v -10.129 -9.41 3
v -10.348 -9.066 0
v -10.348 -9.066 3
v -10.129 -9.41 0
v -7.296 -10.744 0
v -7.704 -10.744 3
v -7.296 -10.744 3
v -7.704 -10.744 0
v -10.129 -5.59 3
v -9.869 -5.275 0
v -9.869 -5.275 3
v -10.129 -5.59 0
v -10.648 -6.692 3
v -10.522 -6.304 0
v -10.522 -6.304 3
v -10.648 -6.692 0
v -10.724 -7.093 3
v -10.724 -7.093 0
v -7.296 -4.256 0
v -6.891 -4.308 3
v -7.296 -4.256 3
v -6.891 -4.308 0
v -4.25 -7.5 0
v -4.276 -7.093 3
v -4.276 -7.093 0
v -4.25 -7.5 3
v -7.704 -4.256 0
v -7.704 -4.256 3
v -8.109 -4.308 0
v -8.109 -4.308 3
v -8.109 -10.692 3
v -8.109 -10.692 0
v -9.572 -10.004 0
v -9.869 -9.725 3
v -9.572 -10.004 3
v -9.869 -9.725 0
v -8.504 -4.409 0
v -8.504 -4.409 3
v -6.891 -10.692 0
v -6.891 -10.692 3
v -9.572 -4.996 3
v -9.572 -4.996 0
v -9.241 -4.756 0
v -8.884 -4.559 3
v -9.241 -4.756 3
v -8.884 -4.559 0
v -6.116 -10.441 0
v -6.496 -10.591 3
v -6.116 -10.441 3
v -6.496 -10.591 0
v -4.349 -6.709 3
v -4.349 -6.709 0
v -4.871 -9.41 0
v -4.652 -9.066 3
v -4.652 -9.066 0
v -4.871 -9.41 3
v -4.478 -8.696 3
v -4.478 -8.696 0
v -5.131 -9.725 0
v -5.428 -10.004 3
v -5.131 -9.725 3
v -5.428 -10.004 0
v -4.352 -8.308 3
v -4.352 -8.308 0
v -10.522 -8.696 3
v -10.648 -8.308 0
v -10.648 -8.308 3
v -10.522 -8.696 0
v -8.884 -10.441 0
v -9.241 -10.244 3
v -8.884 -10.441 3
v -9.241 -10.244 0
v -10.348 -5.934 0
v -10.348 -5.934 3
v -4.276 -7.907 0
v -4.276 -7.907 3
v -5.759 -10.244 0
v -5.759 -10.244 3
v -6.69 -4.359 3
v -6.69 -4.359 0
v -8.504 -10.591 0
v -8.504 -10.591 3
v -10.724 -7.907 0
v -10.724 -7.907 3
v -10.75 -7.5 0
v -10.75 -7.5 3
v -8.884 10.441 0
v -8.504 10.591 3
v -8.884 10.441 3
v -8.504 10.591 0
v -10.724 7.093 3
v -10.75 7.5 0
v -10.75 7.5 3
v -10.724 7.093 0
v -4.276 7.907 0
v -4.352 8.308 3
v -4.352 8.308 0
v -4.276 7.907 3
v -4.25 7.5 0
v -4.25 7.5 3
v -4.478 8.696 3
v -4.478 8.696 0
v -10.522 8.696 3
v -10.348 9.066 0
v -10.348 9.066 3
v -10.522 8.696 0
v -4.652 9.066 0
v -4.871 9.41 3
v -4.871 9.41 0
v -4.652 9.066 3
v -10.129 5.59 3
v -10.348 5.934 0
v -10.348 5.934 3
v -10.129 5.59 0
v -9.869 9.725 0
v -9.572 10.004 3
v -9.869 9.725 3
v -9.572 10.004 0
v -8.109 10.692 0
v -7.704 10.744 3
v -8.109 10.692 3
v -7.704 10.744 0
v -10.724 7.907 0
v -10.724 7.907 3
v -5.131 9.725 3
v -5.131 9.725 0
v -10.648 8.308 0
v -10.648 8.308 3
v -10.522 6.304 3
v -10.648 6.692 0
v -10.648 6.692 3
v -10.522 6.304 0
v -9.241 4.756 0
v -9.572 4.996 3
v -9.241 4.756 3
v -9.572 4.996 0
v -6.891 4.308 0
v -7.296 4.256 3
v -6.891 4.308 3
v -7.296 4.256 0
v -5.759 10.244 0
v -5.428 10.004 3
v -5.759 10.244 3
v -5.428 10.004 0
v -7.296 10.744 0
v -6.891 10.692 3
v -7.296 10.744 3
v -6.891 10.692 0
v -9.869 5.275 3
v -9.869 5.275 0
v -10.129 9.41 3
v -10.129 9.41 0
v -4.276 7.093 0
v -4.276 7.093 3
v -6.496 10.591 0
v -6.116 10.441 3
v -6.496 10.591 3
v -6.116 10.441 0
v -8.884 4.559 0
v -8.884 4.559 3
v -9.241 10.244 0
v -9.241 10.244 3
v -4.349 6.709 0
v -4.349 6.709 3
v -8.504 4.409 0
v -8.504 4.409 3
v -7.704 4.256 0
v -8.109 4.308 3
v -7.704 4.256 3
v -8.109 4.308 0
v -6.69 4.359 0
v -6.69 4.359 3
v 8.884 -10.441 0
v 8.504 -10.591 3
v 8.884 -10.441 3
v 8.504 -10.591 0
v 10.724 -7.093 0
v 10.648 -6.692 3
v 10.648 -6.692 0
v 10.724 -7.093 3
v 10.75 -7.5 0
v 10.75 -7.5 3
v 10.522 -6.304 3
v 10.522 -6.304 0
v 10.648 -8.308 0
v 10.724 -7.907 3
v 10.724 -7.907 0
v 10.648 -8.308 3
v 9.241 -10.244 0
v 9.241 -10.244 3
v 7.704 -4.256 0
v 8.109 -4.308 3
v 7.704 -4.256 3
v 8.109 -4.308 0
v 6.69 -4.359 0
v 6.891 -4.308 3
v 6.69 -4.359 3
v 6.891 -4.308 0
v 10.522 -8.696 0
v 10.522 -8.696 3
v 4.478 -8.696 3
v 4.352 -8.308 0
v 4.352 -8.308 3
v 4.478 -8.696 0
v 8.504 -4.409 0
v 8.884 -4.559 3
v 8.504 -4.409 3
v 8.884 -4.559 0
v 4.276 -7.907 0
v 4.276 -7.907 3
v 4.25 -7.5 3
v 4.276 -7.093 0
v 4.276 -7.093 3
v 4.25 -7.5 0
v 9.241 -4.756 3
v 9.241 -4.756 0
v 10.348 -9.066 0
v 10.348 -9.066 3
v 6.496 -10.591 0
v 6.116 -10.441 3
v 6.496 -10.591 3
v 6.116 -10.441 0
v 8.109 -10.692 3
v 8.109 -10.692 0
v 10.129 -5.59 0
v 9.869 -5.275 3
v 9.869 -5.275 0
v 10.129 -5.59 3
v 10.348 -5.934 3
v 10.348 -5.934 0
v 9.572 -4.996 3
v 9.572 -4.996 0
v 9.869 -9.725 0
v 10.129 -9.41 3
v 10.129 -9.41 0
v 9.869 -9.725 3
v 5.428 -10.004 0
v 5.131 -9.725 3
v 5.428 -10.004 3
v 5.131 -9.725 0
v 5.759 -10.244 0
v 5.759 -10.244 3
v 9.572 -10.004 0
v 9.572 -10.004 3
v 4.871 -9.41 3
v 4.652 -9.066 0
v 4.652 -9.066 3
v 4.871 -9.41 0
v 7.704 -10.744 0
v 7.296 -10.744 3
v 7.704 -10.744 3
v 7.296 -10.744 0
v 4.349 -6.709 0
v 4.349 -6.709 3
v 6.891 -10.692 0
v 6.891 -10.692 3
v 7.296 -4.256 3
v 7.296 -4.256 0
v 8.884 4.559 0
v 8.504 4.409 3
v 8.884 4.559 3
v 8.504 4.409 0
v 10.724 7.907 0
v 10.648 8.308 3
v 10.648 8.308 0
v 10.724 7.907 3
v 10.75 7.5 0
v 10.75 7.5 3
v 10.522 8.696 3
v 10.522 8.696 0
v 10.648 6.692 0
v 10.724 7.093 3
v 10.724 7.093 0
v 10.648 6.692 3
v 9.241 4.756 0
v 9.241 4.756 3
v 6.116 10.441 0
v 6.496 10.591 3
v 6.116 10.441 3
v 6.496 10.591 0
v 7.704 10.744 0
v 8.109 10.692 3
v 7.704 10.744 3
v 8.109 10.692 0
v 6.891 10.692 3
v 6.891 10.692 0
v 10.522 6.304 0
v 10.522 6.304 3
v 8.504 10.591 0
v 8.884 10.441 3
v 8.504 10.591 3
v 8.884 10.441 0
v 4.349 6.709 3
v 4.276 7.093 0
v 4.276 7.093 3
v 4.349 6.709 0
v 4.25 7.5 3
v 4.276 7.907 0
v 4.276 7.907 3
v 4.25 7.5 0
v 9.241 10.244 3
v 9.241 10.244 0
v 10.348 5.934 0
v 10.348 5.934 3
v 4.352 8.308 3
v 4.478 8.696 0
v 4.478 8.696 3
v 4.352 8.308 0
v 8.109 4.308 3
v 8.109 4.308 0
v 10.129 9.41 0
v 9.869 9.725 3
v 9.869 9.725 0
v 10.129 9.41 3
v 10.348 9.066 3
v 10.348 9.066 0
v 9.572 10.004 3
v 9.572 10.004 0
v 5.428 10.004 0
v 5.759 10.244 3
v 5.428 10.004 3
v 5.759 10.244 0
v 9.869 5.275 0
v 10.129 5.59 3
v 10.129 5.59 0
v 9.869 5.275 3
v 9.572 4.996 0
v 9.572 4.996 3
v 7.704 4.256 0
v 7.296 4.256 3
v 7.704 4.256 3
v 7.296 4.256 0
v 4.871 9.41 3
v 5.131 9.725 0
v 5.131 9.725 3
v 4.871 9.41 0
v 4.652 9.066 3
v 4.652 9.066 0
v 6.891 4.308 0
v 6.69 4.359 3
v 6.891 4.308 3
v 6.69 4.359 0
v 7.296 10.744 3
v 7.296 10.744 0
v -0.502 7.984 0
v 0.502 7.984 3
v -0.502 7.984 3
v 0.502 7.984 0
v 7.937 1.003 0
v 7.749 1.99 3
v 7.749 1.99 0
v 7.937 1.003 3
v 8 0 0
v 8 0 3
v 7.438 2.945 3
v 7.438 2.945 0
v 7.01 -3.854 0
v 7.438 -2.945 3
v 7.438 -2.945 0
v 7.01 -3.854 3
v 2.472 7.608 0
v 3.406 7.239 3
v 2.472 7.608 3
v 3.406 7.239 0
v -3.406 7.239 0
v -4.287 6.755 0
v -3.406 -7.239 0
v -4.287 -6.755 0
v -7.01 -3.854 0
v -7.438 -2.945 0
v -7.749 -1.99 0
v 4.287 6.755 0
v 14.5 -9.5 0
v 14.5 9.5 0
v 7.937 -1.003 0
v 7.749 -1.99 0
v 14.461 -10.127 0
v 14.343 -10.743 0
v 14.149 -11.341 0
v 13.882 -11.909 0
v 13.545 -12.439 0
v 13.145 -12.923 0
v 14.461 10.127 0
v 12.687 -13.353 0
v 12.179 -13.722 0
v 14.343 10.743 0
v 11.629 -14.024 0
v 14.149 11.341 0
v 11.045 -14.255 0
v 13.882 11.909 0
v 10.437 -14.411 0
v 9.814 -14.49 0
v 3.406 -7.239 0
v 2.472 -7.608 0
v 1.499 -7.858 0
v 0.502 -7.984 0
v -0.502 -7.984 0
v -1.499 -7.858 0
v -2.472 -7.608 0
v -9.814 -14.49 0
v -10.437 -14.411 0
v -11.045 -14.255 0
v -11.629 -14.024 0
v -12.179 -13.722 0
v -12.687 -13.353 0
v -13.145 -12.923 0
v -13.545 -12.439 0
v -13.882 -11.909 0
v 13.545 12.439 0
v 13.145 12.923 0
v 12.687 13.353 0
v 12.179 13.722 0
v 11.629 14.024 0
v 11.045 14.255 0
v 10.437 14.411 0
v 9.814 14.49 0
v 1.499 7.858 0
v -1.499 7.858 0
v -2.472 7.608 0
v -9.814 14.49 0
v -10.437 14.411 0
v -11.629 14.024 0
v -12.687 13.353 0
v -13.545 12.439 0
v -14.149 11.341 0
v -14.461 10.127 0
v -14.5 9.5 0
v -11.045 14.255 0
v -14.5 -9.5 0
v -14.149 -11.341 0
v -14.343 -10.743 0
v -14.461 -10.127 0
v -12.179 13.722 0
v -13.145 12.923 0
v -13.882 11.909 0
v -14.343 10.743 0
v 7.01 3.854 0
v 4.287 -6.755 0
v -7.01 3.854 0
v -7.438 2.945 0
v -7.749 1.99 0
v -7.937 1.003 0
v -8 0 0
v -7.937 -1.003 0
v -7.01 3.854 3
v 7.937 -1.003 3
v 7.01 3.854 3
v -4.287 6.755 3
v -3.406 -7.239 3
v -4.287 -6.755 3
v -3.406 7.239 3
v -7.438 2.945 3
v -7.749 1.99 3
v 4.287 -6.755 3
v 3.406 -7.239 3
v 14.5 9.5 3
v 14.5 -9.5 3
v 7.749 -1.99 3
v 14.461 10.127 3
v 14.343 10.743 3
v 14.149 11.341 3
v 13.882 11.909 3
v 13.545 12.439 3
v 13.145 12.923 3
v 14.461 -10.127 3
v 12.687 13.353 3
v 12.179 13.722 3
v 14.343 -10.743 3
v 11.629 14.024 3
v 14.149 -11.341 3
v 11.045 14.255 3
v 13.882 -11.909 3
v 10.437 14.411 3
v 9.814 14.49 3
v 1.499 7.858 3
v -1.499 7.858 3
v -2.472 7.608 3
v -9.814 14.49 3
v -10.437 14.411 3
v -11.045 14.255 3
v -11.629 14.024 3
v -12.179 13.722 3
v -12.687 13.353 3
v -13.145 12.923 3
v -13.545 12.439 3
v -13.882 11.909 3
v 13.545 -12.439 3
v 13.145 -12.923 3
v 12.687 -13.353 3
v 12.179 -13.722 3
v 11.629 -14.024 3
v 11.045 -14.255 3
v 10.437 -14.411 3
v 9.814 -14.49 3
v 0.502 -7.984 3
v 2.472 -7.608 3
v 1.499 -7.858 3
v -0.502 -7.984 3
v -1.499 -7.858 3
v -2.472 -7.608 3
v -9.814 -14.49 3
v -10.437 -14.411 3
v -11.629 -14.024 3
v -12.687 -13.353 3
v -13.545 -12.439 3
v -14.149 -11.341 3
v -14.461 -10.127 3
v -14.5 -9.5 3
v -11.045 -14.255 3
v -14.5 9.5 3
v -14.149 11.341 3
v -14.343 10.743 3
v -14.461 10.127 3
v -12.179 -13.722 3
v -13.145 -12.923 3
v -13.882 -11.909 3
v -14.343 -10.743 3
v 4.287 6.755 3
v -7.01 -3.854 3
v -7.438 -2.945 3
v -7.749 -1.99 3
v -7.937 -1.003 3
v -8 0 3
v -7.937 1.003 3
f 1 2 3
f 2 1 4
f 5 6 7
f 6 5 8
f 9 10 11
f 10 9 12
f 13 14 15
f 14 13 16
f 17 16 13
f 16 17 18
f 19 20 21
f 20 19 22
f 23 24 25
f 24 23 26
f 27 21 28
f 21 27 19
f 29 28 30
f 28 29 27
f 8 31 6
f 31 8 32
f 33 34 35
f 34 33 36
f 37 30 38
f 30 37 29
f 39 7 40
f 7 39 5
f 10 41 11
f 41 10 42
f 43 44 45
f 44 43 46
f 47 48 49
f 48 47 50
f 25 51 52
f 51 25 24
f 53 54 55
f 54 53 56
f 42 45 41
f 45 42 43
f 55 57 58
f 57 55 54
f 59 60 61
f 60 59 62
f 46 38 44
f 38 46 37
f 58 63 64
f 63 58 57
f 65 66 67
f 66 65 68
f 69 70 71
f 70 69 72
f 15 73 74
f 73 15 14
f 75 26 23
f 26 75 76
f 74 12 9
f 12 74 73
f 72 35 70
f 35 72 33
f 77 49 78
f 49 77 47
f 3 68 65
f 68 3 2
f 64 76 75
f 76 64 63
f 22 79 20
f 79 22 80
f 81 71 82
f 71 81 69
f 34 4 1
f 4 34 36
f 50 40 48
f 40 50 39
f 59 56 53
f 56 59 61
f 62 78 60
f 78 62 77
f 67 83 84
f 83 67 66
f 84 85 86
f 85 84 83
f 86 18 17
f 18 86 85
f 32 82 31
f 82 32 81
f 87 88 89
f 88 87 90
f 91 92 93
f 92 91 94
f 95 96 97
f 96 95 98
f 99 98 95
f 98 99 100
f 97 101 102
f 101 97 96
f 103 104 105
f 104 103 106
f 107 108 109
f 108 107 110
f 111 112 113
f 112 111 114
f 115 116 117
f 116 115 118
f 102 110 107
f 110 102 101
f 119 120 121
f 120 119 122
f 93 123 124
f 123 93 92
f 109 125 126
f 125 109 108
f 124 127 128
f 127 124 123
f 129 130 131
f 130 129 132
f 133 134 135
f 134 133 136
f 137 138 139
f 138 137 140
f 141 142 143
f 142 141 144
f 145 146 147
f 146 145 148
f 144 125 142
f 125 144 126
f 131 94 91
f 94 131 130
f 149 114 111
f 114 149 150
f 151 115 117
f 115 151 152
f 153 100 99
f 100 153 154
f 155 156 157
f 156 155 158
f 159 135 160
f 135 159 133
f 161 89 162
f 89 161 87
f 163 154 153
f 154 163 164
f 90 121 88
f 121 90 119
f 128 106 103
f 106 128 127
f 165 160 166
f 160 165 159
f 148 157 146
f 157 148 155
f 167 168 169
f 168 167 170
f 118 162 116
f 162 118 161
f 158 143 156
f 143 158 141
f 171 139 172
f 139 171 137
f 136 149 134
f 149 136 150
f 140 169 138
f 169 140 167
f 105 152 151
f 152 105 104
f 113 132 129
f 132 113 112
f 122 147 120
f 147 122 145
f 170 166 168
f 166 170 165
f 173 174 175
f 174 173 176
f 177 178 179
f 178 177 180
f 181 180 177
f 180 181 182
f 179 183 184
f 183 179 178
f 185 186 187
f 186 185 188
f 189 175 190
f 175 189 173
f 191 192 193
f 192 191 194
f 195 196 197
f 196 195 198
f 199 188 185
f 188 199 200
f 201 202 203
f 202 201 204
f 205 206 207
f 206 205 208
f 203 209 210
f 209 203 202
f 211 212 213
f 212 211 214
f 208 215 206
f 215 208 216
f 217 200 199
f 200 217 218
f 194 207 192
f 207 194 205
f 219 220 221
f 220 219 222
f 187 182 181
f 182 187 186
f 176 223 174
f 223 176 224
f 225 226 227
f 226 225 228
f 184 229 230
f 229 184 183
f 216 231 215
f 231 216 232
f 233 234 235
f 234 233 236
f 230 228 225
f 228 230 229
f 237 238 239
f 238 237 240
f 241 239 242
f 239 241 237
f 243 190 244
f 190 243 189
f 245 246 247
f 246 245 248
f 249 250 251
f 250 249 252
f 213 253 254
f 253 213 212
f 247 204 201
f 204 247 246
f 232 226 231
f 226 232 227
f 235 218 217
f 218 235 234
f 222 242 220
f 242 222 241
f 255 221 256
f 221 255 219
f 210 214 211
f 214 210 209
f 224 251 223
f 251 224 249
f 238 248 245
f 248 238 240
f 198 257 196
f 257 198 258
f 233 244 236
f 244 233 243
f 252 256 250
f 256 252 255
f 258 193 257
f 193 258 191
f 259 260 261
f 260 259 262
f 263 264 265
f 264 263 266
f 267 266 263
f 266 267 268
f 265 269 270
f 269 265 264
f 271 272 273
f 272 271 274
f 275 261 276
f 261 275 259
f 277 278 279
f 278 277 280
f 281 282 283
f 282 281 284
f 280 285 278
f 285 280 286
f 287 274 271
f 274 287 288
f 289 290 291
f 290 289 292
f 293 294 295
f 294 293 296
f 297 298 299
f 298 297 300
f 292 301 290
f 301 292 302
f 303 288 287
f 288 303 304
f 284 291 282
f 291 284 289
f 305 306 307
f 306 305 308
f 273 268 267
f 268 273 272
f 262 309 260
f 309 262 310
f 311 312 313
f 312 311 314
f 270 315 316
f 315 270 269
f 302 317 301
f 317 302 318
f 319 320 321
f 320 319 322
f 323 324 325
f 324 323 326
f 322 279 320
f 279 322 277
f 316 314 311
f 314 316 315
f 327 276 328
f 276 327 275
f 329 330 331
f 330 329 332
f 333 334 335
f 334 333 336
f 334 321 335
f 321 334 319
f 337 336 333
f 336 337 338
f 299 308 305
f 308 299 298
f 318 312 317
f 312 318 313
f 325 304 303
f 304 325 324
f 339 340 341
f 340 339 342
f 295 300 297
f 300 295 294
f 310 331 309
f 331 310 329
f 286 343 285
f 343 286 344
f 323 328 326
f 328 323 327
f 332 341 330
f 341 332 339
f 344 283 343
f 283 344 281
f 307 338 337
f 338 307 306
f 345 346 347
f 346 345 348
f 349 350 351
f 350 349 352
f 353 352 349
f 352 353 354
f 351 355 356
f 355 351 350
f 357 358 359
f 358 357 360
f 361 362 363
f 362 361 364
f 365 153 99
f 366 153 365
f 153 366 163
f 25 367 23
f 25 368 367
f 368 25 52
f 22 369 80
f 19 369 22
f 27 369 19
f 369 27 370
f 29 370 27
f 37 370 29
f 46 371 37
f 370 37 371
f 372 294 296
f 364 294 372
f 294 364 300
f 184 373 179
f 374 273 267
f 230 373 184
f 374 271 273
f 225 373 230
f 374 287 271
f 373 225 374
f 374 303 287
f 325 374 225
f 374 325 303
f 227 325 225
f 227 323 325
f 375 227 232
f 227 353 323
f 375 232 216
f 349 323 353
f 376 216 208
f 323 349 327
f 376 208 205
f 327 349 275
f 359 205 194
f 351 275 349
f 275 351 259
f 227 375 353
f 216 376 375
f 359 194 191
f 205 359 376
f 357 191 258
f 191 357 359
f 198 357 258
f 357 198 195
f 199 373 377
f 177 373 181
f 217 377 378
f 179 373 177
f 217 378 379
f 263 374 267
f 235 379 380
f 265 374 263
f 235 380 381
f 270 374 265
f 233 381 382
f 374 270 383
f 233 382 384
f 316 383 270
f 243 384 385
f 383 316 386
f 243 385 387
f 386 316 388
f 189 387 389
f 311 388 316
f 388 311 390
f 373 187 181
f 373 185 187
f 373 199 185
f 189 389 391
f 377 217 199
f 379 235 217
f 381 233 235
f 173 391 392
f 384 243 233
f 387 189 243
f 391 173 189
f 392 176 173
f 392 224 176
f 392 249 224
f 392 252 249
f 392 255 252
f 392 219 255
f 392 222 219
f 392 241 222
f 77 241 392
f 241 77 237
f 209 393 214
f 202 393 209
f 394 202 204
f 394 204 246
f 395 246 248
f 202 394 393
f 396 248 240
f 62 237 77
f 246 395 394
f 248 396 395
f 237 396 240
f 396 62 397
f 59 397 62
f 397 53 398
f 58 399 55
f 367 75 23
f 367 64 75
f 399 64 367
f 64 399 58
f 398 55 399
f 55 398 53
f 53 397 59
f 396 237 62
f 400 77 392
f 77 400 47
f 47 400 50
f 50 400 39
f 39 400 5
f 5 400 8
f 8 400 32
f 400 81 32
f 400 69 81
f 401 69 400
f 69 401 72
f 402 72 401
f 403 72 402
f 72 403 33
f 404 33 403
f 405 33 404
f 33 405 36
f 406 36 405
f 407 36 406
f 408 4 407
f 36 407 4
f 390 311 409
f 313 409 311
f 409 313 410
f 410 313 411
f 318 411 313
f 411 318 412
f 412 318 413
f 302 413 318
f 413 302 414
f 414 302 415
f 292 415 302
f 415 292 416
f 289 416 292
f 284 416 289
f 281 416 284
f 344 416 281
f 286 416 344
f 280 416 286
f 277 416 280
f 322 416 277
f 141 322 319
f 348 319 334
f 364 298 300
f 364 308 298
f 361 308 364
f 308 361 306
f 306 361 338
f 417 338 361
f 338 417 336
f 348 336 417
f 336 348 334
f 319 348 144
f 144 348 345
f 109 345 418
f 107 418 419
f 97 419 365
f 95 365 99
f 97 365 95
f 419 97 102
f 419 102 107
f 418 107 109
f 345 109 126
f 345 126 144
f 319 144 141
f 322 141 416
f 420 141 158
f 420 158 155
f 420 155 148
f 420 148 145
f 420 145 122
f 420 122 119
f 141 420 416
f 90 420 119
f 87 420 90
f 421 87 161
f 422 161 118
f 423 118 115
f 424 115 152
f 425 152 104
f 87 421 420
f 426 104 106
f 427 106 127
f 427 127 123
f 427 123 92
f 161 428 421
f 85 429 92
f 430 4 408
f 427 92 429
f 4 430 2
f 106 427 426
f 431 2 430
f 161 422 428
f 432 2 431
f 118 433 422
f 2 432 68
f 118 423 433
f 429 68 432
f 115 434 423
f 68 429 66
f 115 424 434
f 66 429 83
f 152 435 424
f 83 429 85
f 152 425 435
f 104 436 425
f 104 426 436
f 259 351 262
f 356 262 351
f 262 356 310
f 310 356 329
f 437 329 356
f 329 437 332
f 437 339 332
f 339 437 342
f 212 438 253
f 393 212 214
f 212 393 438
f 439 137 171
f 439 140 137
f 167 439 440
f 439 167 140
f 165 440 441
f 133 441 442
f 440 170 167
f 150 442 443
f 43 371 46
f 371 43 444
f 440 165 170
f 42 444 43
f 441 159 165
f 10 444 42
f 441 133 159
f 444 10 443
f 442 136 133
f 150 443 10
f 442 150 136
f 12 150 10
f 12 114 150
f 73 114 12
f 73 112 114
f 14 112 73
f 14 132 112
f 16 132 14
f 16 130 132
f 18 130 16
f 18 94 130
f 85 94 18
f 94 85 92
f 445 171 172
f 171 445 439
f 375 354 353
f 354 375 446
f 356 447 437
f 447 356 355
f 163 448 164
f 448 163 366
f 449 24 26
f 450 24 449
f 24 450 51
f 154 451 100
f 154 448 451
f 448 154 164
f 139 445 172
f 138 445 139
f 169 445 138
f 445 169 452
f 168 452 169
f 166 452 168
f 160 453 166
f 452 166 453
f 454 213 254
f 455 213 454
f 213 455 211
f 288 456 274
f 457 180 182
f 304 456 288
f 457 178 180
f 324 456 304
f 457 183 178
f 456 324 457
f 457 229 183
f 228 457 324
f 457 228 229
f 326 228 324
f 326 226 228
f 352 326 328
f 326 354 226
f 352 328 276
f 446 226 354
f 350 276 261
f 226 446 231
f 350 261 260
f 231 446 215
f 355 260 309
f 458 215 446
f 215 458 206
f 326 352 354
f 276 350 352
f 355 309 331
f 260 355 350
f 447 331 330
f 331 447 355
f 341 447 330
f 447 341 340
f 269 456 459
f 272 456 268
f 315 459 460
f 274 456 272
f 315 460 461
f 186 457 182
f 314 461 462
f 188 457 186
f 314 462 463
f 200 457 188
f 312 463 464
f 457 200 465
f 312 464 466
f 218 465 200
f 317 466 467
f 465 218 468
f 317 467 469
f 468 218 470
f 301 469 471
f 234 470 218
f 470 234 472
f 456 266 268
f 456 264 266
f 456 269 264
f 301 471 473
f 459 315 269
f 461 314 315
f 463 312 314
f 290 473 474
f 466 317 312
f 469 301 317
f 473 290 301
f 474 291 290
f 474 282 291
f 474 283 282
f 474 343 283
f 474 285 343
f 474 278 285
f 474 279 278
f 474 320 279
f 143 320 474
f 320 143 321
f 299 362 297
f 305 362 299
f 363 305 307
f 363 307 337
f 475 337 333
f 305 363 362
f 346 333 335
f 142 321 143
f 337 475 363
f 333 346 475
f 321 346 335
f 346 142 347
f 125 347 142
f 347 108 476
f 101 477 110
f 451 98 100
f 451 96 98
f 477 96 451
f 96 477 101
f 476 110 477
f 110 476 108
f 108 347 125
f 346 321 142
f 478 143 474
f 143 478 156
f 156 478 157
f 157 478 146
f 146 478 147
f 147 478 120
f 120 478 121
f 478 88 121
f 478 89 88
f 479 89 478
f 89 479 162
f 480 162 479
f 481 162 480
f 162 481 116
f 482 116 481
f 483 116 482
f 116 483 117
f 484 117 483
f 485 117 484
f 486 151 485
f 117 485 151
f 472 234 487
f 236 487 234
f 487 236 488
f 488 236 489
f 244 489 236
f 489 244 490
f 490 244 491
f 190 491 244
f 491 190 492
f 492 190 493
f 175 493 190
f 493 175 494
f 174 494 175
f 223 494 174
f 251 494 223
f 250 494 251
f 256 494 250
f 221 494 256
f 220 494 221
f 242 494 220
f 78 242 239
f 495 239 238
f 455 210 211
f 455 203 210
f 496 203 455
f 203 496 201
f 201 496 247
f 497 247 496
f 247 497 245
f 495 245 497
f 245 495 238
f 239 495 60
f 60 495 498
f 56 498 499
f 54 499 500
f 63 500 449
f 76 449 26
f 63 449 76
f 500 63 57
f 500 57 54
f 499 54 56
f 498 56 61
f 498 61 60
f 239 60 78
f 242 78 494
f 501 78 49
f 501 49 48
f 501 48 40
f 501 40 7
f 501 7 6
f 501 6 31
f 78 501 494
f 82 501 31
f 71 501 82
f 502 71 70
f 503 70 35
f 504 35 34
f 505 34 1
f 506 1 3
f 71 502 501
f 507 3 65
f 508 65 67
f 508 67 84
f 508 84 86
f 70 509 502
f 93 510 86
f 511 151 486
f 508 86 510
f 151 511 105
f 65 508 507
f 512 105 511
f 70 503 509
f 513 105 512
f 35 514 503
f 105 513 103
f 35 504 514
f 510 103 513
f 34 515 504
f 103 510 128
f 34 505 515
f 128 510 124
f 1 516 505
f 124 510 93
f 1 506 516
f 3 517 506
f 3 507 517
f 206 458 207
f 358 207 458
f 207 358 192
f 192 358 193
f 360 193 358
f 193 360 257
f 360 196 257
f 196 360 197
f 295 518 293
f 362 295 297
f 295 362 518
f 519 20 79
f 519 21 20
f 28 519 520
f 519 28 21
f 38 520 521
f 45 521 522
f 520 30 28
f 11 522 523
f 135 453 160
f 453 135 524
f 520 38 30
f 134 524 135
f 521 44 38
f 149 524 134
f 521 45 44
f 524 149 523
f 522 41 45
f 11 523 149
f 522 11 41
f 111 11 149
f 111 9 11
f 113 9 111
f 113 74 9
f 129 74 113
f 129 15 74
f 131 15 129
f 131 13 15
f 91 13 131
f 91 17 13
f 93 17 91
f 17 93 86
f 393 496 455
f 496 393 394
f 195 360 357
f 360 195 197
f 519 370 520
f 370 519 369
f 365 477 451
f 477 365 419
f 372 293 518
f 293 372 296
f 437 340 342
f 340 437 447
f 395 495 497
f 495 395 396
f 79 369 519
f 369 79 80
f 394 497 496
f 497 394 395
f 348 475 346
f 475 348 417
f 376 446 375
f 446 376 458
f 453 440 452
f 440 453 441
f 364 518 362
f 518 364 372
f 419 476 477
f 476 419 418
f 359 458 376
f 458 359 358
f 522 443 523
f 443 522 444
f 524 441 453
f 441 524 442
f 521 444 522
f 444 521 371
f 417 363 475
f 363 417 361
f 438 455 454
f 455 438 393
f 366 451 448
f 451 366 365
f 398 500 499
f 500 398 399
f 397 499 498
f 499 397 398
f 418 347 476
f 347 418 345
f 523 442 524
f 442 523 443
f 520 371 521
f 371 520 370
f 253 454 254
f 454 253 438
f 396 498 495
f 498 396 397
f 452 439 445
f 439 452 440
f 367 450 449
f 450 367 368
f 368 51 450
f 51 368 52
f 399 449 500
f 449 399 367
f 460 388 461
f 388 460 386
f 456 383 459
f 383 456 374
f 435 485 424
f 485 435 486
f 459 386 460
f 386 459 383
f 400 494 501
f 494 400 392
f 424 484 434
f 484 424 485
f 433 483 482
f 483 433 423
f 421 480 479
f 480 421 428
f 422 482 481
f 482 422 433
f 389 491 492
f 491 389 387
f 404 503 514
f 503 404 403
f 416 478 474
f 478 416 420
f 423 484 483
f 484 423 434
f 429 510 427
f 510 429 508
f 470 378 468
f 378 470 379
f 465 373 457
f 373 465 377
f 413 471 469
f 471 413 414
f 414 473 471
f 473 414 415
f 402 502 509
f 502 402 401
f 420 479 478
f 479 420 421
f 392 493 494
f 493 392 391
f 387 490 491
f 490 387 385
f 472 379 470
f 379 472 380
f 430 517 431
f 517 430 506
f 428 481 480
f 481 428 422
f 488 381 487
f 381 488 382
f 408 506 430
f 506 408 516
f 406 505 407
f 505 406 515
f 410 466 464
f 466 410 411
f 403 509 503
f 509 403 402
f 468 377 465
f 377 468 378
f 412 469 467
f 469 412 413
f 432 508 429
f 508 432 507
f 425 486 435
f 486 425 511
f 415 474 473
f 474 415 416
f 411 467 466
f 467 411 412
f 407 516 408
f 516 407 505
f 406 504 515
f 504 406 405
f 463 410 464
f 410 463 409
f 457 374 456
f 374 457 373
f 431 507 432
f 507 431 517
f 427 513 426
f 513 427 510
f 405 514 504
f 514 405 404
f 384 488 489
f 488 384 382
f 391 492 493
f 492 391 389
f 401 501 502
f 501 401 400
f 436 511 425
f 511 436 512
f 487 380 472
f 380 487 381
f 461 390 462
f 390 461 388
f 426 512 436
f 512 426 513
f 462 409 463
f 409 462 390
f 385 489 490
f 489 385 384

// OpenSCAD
$fn = 50;


difference() {
	union() {
		hull() {
			translate(v = [-9.5000000000, 9.5000000000, 0]) {
				cylinder(h = 3, r = 5);
			}
			translate(v = [9.5000000000, 9.5000000000, 0]) {
				cylinder(h = 3, r = 5);
			}
			translate(v = [-9.5000000000, -9.5000000000, 0]) {
				cylinder(h = 3, r = 5);
			}
			translate(v = [9.5000000000, -9.5000000000, 0]) {
				cylinder(h = 3, r = 5);
			}
		}
	}
	union() {
		#translate(v = [-7.5000000000, -7.5000000000, -100.0000000000]) {
			cylinder(h = 200, r = 3.2500000000);
		}
		#translate(v = [-7.5000000000, 7.5000000000, -100.0000000000]) {
			cylinder(h = 200, r = 3.2500000000);
		}
		#translate(v = [7.5000000000, -7.5000000000, -100.0000000000]) {
			cylinder(h = 200, r = 3.2500000000);
		}
		#translate(v = [7.5000000000, 7.5000000000, -100.0000000000]) {
			cylinder(h = 200, r = 3.2500000000);
		}
		#cylinder(h = 3, r = 8.0000000000);
	}
}
